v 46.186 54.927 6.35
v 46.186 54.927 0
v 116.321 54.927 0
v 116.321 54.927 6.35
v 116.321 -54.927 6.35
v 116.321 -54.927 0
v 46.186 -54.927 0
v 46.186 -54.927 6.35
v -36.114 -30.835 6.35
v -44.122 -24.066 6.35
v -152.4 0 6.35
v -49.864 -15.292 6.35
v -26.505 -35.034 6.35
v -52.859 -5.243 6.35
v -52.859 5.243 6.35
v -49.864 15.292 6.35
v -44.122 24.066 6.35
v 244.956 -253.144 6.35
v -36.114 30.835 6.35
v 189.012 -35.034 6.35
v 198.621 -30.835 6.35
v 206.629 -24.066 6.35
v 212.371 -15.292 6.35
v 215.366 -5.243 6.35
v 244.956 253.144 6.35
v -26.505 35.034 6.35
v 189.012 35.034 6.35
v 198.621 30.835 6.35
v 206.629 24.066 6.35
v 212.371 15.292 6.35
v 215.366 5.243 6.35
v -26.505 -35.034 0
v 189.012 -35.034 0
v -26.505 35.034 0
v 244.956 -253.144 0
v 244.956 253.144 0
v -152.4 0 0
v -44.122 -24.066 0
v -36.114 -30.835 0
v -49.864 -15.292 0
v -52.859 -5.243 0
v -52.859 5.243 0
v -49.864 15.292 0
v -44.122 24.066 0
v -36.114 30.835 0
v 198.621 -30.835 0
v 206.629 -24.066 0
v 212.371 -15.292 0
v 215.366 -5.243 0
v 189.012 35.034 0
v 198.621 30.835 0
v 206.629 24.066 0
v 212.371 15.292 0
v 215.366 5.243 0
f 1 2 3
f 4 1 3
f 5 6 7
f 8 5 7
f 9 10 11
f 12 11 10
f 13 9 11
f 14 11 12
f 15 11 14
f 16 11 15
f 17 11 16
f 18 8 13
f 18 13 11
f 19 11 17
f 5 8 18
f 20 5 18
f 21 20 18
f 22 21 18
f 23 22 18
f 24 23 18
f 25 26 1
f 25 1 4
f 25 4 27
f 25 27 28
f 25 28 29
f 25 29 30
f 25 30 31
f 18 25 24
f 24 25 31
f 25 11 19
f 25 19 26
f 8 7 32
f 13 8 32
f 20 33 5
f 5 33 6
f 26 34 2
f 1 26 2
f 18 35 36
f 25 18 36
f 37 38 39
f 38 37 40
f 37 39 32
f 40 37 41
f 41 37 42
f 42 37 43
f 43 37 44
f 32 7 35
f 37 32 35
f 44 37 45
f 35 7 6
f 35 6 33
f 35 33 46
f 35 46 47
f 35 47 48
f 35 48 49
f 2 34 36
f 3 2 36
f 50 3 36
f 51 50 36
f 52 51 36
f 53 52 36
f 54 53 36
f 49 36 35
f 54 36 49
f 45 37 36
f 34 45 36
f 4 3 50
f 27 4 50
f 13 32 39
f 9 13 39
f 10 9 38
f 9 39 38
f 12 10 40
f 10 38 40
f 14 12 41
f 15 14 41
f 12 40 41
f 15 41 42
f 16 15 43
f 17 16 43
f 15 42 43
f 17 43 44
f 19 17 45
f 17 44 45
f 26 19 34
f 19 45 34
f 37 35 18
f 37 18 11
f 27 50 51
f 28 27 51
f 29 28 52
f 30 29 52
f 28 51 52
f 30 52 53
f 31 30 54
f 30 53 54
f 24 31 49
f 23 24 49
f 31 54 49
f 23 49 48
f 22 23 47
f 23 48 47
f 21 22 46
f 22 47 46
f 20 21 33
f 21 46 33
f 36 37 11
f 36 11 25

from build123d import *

# Parameters (mm, degrees)
BOSS_EXTRUDE1_DEPTH = 6.35
CUT_EXTRUDE1_DEPTH  = 7.35
SKETCH3_OUTSIDE_W   = 609.496
SKETCH3_OUTSIDE_H   = 769.968
CUT_EXTRUDE6_DEPTH  = 7.35


with BuildPart() as part:
    # Sketch1 → Boss-Extrude1 (new body)
    with BuildSketch(Plane.XY):
        Polygon((228.232926514, 307.505861177), (-209.583790114, 0.94329584), (-209.583790114, -0.94329584), (228.232926514, -307.505861177), (244.956408235, -271.642238892), (244.956408235, 271.642238892), align=None)
    extrude(amount=BOSS_EXTRUDE1_DEPTH)

    # Sketch2 → Cut-Extrude1 (cut, through all)
    with BuildSketch(Plane(origin=(0, 0, 0), x_dir=(-1, 0, 0), z_dir=(0, 0, -1))):
        with BuildLine():
            Line((-46.185656441, -54.927437645), (26.505438481, -35.03371061))
            ThreePointArc((26.505438481, -35.03371061), (53.239591757, 0), (26.505438481, 35.03371061))
            Line((26.505438481, 35.03371061), (-46.185656445, 54.927437638))
            Line((-46.185656445, 54.927437638), (-116.321160011, 54.927437643))
            Line((-116.321160011, 54.927437643), (-189.012254957, 35.03371061))
            ThreePointArc((-189.012254957, 35.03371061), (-215.746408235, 1e-09), (-189.012254959, -35.033710609))
            Line((-189.012254959, -35.033710609), (-116.32116001, -54.927437641))
            Line((-116.32116001, -54.927437641), (-46.185656441, -54.927437645))
        make_face()
    extrude(amount=-CUT_EXTRUDE1_DEPTH, mode=Mode.SUBTRACT)

    # Sketch3 outside → Cut-Extrude6 (cut, through all)
    with BuildSketch(Plane.XY):
        with Locations((17.686, 0)):
            Rectangle(SKETCH3_OUTSIDE_W, SKETCH3_OUTSIDE_H)
        Polygon((244.956408235, -253.143950628), (-152.4, 0), (244.956408235, 253.143950628), align=None, mode=Mode.SUBTRACT)
    extrude(amount=CUT_EXTRUDE6_DEPTH, mode=Mode.SUBTRACT)


solid = part.part
